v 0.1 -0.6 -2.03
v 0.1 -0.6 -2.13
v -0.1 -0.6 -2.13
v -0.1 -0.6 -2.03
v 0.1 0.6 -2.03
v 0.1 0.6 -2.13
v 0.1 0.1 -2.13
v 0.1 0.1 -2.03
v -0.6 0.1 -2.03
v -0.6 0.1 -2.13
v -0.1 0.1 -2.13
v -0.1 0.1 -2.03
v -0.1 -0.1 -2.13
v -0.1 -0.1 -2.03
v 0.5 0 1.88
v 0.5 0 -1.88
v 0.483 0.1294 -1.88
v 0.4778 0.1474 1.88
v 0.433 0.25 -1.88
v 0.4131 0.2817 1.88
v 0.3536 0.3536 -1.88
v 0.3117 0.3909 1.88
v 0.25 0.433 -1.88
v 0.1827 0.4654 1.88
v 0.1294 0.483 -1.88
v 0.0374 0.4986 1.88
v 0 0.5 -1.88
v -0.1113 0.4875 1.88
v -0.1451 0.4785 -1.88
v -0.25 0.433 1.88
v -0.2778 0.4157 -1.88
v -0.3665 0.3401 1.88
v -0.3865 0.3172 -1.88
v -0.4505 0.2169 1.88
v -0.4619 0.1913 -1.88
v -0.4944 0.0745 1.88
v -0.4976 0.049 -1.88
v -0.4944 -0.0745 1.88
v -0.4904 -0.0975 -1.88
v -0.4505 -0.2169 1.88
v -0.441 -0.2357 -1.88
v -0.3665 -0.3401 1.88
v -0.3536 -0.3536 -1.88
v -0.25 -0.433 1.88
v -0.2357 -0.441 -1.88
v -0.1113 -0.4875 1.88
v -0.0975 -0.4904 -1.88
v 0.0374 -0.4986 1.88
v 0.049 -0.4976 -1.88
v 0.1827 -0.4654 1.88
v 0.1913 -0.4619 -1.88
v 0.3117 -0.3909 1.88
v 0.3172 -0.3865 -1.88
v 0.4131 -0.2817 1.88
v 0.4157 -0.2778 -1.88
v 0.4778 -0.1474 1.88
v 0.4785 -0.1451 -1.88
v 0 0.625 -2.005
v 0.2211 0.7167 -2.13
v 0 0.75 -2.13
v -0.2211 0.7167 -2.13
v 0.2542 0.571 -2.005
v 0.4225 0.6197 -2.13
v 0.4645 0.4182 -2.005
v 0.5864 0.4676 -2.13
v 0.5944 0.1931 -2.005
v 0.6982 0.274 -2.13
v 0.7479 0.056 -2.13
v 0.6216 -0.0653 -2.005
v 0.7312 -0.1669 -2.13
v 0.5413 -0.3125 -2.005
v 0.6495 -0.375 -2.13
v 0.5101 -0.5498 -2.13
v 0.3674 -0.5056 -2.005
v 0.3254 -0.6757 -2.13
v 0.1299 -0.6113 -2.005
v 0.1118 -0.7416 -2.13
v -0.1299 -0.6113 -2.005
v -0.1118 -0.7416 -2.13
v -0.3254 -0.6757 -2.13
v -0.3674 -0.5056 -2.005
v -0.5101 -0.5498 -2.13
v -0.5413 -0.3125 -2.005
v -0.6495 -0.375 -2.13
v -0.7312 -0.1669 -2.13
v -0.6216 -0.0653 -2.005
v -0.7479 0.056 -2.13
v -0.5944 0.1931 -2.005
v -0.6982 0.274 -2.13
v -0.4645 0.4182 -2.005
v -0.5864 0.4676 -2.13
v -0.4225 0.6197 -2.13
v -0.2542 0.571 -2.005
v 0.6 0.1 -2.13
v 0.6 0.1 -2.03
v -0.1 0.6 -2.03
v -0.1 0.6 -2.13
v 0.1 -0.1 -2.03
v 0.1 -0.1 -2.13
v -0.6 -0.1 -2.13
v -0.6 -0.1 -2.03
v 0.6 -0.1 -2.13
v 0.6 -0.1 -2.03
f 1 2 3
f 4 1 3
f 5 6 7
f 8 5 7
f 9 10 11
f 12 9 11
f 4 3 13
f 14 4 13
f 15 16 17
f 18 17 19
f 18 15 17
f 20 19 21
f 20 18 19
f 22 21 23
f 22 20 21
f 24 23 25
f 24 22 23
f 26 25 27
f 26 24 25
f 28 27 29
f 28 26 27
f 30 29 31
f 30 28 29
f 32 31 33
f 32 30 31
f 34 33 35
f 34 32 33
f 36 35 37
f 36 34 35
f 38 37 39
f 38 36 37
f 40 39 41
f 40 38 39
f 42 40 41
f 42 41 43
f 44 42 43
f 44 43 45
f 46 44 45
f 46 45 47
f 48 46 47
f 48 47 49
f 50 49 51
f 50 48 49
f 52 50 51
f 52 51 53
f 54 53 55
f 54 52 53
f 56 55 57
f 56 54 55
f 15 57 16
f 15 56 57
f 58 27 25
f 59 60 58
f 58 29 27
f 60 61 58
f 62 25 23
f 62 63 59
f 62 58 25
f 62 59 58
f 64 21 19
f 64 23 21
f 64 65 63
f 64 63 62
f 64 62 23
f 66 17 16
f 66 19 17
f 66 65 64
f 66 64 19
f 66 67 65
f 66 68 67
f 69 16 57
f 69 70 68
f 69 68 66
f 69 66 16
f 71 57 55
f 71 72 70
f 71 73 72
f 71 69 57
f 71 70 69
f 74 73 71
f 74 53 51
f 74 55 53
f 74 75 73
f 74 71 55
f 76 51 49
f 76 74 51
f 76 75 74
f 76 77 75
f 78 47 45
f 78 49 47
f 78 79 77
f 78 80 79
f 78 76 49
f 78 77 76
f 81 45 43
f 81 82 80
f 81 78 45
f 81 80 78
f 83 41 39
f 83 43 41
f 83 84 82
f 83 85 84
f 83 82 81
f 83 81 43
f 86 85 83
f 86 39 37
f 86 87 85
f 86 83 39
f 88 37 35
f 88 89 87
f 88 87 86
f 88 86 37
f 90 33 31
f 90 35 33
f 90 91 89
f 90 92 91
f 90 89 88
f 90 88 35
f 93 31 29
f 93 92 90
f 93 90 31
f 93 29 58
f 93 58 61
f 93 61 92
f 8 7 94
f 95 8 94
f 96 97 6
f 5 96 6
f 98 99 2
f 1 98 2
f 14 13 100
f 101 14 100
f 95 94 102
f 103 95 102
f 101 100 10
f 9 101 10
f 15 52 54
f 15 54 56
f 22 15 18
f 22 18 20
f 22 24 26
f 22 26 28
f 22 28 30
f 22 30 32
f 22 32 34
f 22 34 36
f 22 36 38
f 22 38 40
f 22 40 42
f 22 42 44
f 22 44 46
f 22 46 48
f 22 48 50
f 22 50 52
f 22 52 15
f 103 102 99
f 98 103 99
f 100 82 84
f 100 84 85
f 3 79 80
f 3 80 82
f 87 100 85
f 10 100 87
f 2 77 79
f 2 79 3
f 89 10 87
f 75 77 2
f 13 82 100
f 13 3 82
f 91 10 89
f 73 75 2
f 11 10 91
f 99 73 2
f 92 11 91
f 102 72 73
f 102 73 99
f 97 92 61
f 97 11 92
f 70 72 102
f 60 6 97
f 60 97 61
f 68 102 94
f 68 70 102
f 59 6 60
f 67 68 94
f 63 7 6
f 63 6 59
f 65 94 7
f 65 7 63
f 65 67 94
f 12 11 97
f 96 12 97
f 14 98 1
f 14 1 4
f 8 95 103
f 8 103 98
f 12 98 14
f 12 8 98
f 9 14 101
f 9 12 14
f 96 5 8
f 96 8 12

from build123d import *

# Parameters (mm, degrees)
SKETCH1_R           = 0.5
BOSS_EXTRUDE1_DEPTH = 1.88
CUT_EXTRUDE1_DEPTH  = 0.1


with BuildPart() as part:
    # Sketch1 → Boss-Extrude1 (new body, symmetric)
    with BuildSketch(Plane.XY):
        Circle(SKETCH1_R)
    extrude(amount=BOSS_EXTRUDE1_DEPTH, both=True)

    # Sketch2 → Revolve1 (revolve)
    with BuildSketch(Plane(origin=(0, 0, 0), x_dir=(0, 0, -1), z_dir=(1, 0, 0))):
        Polygon((1.88, 0.5), (2.13, 0.75), (2.13, 0), (1.88, 0), align=None)
    revolve(axis=Axis((0, 0, 2.0805), (0, 0, -1)))

    # Sketch3 → Cut-Extrude1 (cut)
    with BuildSketch(Plane(origin=(0, 0, -2.13), x_dir=(-1, 0, 0), z_dir=(0, 0, -1))):
        Polygon((-0.1, 0.6), (-0.1, 0.1), (-0.6, 0.1), (-0.6, -0.1), (-0.1, -0.1), (-0.1, -0.6), (0.1, -0.6), (0.1, -0.1), (0.6, -0.1), (0.6, 0.1), (0.1, 0.1), (0.1, 0.6), align=None)
    extrude(amount=-CUT_EXTRUDE1_DEPTH, mode=Mode.SUBTRACT)


solid = part.part
